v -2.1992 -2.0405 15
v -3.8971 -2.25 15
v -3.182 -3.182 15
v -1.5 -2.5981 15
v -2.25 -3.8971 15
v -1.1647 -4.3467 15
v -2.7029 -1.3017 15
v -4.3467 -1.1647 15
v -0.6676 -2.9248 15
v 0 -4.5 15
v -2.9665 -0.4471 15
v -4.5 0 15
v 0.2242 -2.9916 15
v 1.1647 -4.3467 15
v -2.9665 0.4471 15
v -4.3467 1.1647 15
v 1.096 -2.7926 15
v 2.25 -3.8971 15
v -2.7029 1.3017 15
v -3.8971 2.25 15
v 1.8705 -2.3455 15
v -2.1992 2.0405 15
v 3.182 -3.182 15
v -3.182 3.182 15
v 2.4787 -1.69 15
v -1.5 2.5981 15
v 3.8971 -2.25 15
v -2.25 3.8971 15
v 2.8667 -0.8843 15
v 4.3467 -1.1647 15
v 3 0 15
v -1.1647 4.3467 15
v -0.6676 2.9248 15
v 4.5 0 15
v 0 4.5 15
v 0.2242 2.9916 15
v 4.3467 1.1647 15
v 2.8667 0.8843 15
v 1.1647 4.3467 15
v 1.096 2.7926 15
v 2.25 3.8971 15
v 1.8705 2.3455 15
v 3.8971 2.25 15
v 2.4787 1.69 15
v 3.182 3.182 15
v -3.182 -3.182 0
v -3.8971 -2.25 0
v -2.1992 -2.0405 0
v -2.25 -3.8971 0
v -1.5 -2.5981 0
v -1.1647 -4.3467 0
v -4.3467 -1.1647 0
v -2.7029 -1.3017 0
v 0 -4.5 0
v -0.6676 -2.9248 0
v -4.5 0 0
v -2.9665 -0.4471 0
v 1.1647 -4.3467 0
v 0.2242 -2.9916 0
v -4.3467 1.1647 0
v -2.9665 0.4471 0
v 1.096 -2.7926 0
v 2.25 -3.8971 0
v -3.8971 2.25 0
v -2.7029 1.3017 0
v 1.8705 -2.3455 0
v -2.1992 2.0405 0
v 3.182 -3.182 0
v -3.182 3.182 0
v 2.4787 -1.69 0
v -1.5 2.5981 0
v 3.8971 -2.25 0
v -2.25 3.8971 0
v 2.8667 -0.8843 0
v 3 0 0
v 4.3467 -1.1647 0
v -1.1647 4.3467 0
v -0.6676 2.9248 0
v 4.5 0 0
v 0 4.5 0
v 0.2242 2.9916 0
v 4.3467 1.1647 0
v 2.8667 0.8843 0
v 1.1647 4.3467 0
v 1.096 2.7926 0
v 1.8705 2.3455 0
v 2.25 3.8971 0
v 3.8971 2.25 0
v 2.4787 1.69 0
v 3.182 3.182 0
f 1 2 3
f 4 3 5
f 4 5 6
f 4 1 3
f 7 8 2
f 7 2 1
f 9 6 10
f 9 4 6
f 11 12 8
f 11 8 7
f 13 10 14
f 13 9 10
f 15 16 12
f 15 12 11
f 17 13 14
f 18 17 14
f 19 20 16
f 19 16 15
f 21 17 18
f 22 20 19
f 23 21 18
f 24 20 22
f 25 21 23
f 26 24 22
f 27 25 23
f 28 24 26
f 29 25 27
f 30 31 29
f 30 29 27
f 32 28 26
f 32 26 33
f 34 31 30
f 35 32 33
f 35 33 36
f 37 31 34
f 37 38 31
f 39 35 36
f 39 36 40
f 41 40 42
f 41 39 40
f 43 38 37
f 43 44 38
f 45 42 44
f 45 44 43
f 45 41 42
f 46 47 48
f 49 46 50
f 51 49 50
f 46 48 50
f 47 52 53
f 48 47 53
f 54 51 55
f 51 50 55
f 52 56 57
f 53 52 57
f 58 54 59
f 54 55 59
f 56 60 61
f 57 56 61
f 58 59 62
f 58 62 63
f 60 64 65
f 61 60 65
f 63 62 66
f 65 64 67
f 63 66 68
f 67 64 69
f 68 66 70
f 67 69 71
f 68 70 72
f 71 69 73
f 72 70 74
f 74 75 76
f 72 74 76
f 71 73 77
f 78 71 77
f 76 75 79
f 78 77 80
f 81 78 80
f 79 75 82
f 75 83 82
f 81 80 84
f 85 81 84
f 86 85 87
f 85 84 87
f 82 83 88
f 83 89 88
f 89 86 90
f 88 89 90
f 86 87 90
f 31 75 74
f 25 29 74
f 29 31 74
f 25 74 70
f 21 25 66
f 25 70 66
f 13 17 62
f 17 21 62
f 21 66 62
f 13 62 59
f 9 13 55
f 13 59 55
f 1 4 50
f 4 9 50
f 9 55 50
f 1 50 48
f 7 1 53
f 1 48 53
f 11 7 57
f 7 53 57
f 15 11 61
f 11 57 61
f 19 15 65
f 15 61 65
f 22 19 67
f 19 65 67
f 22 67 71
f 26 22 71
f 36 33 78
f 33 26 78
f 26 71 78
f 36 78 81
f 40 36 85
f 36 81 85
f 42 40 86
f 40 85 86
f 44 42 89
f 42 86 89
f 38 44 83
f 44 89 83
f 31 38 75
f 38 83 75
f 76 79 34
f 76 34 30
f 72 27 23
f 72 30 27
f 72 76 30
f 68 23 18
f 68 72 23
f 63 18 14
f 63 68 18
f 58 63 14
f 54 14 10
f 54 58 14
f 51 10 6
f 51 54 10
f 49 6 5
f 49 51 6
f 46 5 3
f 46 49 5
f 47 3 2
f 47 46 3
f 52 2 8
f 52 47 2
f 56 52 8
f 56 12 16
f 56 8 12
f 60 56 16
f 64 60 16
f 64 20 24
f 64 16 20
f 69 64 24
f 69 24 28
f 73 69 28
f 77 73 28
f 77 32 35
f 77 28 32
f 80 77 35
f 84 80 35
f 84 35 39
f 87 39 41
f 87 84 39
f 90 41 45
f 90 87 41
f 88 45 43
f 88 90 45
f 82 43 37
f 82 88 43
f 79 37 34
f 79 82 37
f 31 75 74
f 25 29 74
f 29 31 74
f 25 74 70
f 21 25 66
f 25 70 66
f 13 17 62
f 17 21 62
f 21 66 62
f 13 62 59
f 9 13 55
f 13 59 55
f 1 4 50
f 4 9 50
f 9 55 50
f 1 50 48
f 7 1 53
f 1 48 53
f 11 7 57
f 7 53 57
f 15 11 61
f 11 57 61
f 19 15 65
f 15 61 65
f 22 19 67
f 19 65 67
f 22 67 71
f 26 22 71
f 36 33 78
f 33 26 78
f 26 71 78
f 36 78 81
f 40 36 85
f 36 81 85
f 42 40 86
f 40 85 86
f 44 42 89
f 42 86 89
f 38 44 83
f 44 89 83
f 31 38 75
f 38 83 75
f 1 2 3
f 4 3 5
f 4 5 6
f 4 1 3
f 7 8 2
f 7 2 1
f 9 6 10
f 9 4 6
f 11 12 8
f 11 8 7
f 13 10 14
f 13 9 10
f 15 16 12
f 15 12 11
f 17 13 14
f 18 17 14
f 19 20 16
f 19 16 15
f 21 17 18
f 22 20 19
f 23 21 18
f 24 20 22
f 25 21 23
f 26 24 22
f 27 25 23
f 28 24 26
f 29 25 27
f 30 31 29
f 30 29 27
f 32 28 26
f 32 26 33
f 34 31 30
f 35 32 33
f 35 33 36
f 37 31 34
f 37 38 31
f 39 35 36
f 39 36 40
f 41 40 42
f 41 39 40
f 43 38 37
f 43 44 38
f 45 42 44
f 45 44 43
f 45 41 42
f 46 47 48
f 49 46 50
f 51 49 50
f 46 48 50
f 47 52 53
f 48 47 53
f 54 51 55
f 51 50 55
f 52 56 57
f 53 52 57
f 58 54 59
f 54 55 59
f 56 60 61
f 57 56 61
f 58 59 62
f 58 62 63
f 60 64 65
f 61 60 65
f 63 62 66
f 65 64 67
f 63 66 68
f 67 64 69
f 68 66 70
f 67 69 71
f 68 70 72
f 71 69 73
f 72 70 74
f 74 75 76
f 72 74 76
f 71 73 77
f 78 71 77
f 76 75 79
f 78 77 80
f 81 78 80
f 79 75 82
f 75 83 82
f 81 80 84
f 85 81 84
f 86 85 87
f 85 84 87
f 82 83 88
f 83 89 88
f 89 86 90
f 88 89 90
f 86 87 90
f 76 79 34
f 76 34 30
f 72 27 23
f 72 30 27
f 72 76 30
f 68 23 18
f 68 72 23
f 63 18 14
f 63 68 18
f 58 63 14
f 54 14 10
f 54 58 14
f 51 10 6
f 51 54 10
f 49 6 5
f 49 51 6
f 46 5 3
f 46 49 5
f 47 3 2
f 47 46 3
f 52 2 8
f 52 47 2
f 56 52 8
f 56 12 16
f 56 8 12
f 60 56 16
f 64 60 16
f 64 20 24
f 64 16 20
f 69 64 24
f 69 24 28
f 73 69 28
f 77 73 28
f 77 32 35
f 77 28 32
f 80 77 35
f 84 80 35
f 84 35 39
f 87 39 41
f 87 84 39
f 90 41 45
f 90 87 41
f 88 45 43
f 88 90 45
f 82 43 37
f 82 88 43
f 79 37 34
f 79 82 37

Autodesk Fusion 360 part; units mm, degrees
sketch "Sketch1" plane through (0, 0, 0) normal (0, 0, 1) x (1, 0, 0)
  circle A0 centre (0, 0) radius 3
  circle A1 centre (0, 0) radius 4.5
  dimension "d1" = 6
  dimension "d2" = 9
extrude "Extrude1" add sketch "Sketch1" along normal blind 15 makes body 1
extrude "Extrude2" add sketch "Sketch1" along normal blind 15 separate body makes body 2
